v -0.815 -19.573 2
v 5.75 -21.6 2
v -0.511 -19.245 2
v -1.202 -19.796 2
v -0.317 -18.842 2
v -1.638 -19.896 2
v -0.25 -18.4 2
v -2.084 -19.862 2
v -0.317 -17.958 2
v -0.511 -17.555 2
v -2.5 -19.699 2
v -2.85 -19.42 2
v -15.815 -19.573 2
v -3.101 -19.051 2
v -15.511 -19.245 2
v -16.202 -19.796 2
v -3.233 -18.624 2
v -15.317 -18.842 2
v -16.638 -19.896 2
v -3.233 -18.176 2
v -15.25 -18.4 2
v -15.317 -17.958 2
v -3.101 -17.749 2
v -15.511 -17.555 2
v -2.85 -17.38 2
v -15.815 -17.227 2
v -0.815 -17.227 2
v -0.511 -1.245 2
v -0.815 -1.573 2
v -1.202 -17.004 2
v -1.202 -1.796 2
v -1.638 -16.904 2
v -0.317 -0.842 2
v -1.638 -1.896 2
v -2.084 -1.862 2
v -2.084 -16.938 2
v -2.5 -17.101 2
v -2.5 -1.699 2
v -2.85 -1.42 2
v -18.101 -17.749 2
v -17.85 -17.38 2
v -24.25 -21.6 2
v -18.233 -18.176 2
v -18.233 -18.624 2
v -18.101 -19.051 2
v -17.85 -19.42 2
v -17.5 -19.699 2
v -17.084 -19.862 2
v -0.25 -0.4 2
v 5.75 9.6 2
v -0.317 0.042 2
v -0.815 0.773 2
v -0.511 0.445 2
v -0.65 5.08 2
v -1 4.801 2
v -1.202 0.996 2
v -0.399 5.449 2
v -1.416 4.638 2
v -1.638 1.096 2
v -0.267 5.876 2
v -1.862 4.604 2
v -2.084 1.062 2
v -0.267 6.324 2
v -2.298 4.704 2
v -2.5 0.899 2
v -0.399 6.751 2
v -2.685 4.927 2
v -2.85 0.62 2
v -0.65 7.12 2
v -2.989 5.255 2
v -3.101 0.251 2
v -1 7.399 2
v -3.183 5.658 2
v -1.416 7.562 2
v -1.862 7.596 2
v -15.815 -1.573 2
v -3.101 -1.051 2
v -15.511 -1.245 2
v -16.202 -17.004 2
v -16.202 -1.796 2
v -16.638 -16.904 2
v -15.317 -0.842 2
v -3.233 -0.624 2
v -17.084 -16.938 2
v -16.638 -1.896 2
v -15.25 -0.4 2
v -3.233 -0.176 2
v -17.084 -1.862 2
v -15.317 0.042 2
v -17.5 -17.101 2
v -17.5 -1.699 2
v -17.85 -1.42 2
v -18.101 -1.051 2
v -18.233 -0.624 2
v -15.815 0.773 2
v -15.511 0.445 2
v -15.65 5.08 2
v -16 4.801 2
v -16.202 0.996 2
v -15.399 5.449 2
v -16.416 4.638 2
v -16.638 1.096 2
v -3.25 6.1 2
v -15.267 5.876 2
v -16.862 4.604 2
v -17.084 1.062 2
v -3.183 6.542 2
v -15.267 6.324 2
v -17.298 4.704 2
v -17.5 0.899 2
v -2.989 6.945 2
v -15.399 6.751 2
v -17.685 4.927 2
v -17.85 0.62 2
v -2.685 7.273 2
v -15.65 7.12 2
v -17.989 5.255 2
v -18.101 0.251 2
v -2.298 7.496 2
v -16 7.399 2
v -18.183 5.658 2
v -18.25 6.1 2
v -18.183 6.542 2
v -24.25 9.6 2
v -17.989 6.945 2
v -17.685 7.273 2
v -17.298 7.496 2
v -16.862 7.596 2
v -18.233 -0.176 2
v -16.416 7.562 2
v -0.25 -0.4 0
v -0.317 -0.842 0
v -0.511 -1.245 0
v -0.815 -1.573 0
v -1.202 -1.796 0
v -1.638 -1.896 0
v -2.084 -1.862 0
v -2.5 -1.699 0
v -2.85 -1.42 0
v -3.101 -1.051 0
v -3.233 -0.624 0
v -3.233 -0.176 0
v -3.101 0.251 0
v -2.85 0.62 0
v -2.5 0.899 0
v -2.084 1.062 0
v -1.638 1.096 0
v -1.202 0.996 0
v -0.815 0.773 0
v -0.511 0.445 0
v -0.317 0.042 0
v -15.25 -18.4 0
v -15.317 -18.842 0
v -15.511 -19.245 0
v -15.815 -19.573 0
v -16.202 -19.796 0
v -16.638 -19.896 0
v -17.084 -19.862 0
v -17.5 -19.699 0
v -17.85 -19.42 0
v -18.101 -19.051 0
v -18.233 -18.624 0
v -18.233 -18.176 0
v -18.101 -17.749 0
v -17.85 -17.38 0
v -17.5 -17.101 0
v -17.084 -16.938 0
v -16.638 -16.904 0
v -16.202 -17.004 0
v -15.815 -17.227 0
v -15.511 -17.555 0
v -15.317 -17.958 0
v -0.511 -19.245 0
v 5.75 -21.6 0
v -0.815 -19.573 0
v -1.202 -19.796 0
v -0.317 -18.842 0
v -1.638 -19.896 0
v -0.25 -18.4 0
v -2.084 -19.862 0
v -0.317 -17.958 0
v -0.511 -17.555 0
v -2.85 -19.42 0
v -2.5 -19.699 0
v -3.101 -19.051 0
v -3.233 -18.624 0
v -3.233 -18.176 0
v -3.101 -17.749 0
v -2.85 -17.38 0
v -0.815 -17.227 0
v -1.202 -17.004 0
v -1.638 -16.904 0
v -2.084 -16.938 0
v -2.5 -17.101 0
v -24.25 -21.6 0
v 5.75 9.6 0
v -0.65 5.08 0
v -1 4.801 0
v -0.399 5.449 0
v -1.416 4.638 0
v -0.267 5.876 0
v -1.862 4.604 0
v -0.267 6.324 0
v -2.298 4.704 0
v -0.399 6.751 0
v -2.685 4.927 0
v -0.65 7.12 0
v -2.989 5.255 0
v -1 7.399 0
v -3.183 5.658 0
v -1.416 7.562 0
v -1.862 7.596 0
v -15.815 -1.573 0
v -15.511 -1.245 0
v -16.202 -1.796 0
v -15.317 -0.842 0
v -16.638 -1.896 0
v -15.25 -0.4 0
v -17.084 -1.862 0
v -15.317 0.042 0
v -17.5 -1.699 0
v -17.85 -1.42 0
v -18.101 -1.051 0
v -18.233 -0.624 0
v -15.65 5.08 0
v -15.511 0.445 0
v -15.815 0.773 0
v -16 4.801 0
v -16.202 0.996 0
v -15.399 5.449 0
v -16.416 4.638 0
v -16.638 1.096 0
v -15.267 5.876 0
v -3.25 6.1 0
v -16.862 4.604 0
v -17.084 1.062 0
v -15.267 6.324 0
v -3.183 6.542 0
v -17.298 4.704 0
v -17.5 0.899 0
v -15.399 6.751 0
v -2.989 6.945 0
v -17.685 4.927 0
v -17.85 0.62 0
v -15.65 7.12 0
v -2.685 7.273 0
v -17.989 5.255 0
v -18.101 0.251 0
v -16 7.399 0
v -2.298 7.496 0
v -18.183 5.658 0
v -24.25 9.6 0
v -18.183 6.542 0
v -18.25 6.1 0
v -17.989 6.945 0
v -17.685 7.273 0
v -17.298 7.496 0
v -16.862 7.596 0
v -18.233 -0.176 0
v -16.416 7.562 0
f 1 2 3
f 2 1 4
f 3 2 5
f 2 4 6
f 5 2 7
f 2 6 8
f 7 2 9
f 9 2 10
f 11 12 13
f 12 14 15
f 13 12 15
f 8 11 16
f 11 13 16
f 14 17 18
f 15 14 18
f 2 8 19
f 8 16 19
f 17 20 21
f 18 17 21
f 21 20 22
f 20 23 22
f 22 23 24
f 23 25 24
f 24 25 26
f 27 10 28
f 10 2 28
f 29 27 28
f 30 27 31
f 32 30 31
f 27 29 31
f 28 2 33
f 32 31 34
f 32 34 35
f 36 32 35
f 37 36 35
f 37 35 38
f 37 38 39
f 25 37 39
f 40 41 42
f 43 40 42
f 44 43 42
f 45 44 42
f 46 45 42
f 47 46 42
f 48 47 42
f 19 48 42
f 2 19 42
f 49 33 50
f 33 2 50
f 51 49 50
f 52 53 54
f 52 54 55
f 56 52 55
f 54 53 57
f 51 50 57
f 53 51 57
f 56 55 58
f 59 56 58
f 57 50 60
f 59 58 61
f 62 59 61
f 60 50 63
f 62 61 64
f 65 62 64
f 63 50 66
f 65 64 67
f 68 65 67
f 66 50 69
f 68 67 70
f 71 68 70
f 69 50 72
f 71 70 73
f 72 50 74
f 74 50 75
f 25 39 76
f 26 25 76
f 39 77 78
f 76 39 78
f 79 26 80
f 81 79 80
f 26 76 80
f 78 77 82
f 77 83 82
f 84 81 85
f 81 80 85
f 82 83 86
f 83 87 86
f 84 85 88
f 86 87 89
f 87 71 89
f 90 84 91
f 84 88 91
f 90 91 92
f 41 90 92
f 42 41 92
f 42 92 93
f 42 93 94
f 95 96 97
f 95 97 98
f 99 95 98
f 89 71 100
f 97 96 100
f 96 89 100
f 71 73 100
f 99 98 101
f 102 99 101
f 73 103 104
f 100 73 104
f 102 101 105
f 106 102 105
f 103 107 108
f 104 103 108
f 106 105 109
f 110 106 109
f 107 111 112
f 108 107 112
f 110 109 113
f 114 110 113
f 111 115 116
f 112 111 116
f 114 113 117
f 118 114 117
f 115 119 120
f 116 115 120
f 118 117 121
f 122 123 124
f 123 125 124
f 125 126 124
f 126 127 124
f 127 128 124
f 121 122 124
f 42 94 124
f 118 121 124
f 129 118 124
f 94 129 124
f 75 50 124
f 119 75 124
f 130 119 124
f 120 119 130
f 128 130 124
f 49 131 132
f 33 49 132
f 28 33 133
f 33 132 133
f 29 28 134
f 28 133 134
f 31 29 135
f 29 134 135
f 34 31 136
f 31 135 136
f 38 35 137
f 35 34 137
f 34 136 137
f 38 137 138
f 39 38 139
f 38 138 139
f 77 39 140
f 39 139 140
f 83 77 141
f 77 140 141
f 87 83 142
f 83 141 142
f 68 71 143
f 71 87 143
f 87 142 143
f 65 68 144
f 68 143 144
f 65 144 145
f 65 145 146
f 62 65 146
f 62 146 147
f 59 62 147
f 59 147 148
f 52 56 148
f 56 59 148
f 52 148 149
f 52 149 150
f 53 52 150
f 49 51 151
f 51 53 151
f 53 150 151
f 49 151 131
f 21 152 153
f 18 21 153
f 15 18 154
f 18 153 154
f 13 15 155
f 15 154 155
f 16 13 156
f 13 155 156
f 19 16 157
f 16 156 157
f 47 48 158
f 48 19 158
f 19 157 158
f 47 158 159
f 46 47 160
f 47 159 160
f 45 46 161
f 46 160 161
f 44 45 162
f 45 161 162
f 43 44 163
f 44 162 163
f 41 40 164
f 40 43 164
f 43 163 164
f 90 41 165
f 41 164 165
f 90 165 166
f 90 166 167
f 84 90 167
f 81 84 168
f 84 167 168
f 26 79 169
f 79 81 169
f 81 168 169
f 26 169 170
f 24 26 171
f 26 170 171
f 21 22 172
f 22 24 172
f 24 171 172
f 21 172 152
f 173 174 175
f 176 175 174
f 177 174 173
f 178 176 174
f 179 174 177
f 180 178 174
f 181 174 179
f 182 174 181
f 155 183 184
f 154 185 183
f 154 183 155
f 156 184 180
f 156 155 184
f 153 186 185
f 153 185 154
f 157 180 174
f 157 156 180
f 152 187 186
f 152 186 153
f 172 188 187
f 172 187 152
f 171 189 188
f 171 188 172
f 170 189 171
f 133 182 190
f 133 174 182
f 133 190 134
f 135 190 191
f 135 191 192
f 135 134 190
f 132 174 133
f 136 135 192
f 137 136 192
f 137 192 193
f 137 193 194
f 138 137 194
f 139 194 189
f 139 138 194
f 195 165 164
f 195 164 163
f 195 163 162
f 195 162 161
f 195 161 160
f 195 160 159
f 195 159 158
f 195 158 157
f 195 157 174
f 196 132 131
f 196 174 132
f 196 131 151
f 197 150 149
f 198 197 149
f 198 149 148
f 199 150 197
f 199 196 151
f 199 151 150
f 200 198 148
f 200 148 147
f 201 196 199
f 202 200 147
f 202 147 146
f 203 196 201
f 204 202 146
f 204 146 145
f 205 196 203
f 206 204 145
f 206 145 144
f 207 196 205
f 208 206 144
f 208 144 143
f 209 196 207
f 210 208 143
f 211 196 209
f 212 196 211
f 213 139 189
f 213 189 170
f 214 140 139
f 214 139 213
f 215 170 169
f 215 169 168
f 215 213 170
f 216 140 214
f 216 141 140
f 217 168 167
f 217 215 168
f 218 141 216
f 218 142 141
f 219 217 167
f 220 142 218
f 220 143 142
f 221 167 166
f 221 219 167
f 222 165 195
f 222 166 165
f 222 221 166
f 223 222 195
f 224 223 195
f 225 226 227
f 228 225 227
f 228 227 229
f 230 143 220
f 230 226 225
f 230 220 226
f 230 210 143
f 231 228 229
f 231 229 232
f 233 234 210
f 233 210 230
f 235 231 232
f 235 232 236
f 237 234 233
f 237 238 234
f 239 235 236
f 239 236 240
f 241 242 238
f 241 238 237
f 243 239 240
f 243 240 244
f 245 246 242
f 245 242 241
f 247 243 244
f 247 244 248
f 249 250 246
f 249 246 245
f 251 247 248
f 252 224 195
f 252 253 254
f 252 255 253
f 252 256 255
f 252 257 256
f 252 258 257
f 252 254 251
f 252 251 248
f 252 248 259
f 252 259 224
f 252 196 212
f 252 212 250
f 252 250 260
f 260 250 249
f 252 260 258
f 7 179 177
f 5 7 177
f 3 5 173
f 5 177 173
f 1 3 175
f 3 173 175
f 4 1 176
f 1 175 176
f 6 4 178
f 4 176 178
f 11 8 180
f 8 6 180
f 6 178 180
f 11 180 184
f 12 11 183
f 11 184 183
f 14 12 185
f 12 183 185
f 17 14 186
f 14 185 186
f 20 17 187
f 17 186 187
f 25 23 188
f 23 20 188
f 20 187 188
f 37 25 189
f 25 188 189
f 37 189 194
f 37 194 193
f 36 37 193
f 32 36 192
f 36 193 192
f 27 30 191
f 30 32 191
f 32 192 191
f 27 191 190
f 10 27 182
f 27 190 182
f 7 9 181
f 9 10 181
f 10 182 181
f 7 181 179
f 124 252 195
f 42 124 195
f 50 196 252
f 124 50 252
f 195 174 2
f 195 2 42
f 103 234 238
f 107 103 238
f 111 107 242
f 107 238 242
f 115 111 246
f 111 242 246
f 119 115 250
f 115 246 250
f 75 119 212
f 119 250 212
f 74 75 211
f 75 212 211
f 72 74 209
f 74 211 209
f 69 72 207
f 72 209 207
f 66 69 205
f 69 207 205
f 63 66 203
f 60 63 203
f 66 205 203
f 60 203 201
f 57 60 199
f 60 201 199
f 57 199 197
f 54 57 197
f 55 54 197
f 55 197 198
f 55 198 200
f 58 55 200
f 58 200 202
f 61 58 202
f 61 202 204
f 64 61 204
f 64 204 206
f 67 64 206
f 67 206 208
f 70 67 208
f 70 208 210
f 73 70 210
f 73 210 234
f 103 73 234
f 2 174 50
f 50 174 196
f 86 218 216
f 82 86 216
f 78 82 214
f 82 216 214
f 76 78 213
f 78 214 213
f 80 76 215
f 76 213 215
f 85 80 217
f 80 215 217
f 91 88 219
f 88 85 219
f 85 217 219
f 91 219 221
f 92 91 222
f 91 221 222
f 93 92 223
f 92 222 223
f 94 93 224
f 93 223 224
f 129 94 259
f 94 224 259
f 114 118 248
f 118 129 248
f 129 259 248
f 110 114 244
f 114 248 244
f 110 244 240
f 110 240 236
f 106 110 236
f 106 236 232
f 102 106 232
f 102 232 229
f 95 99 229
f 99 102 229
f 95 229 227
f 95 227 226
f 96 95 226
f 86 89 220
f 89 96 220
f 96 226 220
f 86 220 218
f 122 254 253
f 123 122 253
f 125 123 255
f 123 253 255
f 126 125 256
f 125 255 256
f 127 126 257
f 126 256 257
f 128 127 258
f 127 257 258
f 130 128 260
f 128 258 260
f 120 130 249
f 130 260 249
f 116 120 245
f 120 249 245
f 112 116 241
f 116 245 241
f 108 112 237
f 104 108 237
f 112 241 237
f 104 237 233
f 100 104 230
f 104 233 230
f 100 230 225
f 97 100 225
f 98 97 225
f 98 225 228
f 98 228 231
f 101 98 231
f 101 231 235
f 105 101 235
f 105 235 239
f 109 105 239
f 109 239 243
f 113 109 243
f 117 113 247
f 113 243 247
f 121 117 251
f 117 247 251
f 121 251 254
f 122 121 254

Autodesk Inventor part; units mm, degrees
ref_plane "YZ Plane" through (0, 0, 0) normal (1, 0, 0) x (0, 1, 0)
ref_plane "XZ Plane" through (0, 0, 0) normal (0, 1, 0) x (-1, 0, 0)
ref_plane "XY Plane" through (0, 0, 0) normal (0, 0, 1) x (1, 0, 0)
sketch "Sketch1" plane through (0, 0, 0) normal (0, 0, 1) x (1, 0, 0)
  line L0 (5.75, -21.6) -> (5.75, 21.6) projected
  line L1 (5.75, 21.6) -> (-5.75, 21.6) projected
  line L2 (-5.75, 21.6) -> (-5.75, -21.6) projected
  line L3 (-5.75, -21.6) -> (5.75, -21.6) projected
  circle A0 centre (-1.75, -18.4) radius 1.5 projected
  circle A1 centre (-1.75, 17.6) radius 1.5 projected
  circle A2 centre (-1.75, -0.4) radius 1.5 projected
  line L4 (-12.75, -21.6) -> (-12.75, 21.6) projected
  line L5 (-12.75, 21.6) -> (-24.25, 21.6) projected
  line L6 (-24.25, 21.6) -> (-24.25, -21.6) projected
  line L7 (-24.25, -21.6) -> (-12.75, -21.6) projected
  circle A3 centre (-16.75, 17.6) radius 1.5 projected
  circle A4 centre (-16.75, -0.4) radius 1.5 projected
  circle A5 centre (-16.75, -18.4) radius 1.5 projected
  line L8 (5.75, -21.6) -> (-24.25, -21.6)
  line L9 (-24.25, -21.6) -> (-24.25, 21.6)
  line L10 (-24.25, 21.6) -> (5.75, 21.6)
  line L11 (5.75, 21.6) -> (5.75, -21.6)
  point P0 (0, 0)
extrude "Extrusion1" add sketch "Sketch1" along normal blind 2
sketch "Sketch2" plane through (0, 0, 0) normal (0, 0, -1) x (-1, 0, 0)
  line L0 (-5.75, -21.6) -> (-5.75, 21.6) projected
  line L1 (24.25, -21.6) -> (-5.75, -21.6) projected
  line L2 (24.25, 21.6) -> (24.25, -21.6) projected
  line L3 (-5.75, 21.6) -> (24.25, 21.6) projected
  circle A0 centre (16.75, -18.4) radius 1.5 projected
  circle A1 centre (16.75, -0.4) radius 1.5 projected
  circle A2 centre (16.75, 17.6) radius 1.5 projected
  circle A3 centre (1.75, -0.4) radius 1.5 projected
  circle A4 centre (1.75, 17.6) radius 1.5 projected
  circle A5 centre (1.75, -18.4) radius 1.5 projected
  line L4 (5.2, 10.6) -> (5.2, -18.6)
  line L5 (-5.75, 10.6) -> (5.2, 10.6)
  line L6 (-5.75, -21.6) -> (-5.75, 21.6) projected
  line L7 (24.25, -18.6) -> (24.25, 10.6)
  line L8 (13.3, -18.6) -> (13.3, 10.6)
  line L9 (5.2, -18.6) -> (5.2, -21.6)
  line L10 (13.3, -21.6) -> (13.3, -18.6)
  line L11 (13.3, 10.6) -> (24.25, 10.6)
  line L12 (-5.75, 10.6) -> (5.2, 10.6)
  circle A6 centre (1.75, -0.4) radius 1.75
  circle A7 centre (1.75, 6.1) radius 1.5
  circle A8 centre (16.75, 6.1) radius 1.5
  circle A9 centre (16.75, -0.4) radius 1.75
  point P0 (0, 0)
  point P1 (18.2695, -1.2681)
extrude "Extrusion2" cut sketch "Sketch2" against normal blind 10 contours L0 L3 L2 L11 L8 L10 L1 L9 L4 L5 | A7 | A8
sketch "Sketch3" plane through (0, 0, 0) normal (0, 0, -1) x (-1, 0, 0)
  line L0 (5.2, -21.6) -> (-5.75, -21.6) projected
  line L1 (13.3, 10.6) -> (24.25, 10.6)
  line L2 (24.25, -9.4) -> (24.25, 8.7)
  line L3 (24.25, -18.6) -> (24.25, 10.6)
  line L4 (-5.75, -21.6) -> (-5.75, 10.6) projected
  line L5 (24.25, 10.6) -> (24.25, -21.6) projected
  line L6 (24.25, 10.6) -> (-5.75, 10.6)
  line L7 (-5.75, 10.6) -> (-5.75, -21.6)
  line L8 (-5.75, -21.6) -> (24.25, -21.6)
  line L9 (24.25, -21.6) -> (24.25, 10.6)
  line L10 (5.2, -21.6) -> (5.2, 10.6) projected
  line L11 (13.3, 10.6) -> (13.3, -21.6) projected
  point P0 (0, 0)
extrude "Extrusion3" add sketch "Sketch3" against normal blind 2 contours L10 L6 L11 L8
sketch "Sketch4" plane through (0, 0, 0) normal (0, 0, -1) x (-1, 0, 0)
  circle A0 centre (1.75, -18.4) radius 1.5 projected
  circle A1 centre (1.75, -0.4) radius 1.5 projected
  circle A2 centre (1.75, 6.1) radius 1.5 projected
  line L0 (24.25, -21.6) -> (-5.75, -21.6) projected
  line L1 (24.25, 10.6) -> (24.25, -21.6) projected
  line L2 (24.25, 10.6) -> (-5.75, 10.6) projected
  line L3 (-5.75, -21.6) -> (-5.75, 10.6) projected
  circle A3 centre (16.75, 6.1) radius 1.5 projected
  circle A4 centre (16.75, -18.4) radius 1.5 projected
  circle A5 centre (16.75, -0.4) radius 1.5 projected
  line L4 (-5.75, 10.6) -> (24.25, 10.6) projected
  line L5 (-5.75, -21.6) -> (-5.75, 10.6) projected
  line L6 (24.25, 10.6) -> (-5.75, 10.6)
  line L7 (-5.75, 10.6) -> (-5.75, 9.6)
  line L8 (-5.75, 9.6) -> (24.25, 9.6)
  line L9 (24.25, 9.6) -> (24.25, 10.6)
  point P0 (0, 0)
  dimension "d6" = 1
extrude "Extrusion4" cut sketch "Sketch4" against normal blind 2 contours L8 L3 L2 L1
properties part number "lead_3" material "Lead"
